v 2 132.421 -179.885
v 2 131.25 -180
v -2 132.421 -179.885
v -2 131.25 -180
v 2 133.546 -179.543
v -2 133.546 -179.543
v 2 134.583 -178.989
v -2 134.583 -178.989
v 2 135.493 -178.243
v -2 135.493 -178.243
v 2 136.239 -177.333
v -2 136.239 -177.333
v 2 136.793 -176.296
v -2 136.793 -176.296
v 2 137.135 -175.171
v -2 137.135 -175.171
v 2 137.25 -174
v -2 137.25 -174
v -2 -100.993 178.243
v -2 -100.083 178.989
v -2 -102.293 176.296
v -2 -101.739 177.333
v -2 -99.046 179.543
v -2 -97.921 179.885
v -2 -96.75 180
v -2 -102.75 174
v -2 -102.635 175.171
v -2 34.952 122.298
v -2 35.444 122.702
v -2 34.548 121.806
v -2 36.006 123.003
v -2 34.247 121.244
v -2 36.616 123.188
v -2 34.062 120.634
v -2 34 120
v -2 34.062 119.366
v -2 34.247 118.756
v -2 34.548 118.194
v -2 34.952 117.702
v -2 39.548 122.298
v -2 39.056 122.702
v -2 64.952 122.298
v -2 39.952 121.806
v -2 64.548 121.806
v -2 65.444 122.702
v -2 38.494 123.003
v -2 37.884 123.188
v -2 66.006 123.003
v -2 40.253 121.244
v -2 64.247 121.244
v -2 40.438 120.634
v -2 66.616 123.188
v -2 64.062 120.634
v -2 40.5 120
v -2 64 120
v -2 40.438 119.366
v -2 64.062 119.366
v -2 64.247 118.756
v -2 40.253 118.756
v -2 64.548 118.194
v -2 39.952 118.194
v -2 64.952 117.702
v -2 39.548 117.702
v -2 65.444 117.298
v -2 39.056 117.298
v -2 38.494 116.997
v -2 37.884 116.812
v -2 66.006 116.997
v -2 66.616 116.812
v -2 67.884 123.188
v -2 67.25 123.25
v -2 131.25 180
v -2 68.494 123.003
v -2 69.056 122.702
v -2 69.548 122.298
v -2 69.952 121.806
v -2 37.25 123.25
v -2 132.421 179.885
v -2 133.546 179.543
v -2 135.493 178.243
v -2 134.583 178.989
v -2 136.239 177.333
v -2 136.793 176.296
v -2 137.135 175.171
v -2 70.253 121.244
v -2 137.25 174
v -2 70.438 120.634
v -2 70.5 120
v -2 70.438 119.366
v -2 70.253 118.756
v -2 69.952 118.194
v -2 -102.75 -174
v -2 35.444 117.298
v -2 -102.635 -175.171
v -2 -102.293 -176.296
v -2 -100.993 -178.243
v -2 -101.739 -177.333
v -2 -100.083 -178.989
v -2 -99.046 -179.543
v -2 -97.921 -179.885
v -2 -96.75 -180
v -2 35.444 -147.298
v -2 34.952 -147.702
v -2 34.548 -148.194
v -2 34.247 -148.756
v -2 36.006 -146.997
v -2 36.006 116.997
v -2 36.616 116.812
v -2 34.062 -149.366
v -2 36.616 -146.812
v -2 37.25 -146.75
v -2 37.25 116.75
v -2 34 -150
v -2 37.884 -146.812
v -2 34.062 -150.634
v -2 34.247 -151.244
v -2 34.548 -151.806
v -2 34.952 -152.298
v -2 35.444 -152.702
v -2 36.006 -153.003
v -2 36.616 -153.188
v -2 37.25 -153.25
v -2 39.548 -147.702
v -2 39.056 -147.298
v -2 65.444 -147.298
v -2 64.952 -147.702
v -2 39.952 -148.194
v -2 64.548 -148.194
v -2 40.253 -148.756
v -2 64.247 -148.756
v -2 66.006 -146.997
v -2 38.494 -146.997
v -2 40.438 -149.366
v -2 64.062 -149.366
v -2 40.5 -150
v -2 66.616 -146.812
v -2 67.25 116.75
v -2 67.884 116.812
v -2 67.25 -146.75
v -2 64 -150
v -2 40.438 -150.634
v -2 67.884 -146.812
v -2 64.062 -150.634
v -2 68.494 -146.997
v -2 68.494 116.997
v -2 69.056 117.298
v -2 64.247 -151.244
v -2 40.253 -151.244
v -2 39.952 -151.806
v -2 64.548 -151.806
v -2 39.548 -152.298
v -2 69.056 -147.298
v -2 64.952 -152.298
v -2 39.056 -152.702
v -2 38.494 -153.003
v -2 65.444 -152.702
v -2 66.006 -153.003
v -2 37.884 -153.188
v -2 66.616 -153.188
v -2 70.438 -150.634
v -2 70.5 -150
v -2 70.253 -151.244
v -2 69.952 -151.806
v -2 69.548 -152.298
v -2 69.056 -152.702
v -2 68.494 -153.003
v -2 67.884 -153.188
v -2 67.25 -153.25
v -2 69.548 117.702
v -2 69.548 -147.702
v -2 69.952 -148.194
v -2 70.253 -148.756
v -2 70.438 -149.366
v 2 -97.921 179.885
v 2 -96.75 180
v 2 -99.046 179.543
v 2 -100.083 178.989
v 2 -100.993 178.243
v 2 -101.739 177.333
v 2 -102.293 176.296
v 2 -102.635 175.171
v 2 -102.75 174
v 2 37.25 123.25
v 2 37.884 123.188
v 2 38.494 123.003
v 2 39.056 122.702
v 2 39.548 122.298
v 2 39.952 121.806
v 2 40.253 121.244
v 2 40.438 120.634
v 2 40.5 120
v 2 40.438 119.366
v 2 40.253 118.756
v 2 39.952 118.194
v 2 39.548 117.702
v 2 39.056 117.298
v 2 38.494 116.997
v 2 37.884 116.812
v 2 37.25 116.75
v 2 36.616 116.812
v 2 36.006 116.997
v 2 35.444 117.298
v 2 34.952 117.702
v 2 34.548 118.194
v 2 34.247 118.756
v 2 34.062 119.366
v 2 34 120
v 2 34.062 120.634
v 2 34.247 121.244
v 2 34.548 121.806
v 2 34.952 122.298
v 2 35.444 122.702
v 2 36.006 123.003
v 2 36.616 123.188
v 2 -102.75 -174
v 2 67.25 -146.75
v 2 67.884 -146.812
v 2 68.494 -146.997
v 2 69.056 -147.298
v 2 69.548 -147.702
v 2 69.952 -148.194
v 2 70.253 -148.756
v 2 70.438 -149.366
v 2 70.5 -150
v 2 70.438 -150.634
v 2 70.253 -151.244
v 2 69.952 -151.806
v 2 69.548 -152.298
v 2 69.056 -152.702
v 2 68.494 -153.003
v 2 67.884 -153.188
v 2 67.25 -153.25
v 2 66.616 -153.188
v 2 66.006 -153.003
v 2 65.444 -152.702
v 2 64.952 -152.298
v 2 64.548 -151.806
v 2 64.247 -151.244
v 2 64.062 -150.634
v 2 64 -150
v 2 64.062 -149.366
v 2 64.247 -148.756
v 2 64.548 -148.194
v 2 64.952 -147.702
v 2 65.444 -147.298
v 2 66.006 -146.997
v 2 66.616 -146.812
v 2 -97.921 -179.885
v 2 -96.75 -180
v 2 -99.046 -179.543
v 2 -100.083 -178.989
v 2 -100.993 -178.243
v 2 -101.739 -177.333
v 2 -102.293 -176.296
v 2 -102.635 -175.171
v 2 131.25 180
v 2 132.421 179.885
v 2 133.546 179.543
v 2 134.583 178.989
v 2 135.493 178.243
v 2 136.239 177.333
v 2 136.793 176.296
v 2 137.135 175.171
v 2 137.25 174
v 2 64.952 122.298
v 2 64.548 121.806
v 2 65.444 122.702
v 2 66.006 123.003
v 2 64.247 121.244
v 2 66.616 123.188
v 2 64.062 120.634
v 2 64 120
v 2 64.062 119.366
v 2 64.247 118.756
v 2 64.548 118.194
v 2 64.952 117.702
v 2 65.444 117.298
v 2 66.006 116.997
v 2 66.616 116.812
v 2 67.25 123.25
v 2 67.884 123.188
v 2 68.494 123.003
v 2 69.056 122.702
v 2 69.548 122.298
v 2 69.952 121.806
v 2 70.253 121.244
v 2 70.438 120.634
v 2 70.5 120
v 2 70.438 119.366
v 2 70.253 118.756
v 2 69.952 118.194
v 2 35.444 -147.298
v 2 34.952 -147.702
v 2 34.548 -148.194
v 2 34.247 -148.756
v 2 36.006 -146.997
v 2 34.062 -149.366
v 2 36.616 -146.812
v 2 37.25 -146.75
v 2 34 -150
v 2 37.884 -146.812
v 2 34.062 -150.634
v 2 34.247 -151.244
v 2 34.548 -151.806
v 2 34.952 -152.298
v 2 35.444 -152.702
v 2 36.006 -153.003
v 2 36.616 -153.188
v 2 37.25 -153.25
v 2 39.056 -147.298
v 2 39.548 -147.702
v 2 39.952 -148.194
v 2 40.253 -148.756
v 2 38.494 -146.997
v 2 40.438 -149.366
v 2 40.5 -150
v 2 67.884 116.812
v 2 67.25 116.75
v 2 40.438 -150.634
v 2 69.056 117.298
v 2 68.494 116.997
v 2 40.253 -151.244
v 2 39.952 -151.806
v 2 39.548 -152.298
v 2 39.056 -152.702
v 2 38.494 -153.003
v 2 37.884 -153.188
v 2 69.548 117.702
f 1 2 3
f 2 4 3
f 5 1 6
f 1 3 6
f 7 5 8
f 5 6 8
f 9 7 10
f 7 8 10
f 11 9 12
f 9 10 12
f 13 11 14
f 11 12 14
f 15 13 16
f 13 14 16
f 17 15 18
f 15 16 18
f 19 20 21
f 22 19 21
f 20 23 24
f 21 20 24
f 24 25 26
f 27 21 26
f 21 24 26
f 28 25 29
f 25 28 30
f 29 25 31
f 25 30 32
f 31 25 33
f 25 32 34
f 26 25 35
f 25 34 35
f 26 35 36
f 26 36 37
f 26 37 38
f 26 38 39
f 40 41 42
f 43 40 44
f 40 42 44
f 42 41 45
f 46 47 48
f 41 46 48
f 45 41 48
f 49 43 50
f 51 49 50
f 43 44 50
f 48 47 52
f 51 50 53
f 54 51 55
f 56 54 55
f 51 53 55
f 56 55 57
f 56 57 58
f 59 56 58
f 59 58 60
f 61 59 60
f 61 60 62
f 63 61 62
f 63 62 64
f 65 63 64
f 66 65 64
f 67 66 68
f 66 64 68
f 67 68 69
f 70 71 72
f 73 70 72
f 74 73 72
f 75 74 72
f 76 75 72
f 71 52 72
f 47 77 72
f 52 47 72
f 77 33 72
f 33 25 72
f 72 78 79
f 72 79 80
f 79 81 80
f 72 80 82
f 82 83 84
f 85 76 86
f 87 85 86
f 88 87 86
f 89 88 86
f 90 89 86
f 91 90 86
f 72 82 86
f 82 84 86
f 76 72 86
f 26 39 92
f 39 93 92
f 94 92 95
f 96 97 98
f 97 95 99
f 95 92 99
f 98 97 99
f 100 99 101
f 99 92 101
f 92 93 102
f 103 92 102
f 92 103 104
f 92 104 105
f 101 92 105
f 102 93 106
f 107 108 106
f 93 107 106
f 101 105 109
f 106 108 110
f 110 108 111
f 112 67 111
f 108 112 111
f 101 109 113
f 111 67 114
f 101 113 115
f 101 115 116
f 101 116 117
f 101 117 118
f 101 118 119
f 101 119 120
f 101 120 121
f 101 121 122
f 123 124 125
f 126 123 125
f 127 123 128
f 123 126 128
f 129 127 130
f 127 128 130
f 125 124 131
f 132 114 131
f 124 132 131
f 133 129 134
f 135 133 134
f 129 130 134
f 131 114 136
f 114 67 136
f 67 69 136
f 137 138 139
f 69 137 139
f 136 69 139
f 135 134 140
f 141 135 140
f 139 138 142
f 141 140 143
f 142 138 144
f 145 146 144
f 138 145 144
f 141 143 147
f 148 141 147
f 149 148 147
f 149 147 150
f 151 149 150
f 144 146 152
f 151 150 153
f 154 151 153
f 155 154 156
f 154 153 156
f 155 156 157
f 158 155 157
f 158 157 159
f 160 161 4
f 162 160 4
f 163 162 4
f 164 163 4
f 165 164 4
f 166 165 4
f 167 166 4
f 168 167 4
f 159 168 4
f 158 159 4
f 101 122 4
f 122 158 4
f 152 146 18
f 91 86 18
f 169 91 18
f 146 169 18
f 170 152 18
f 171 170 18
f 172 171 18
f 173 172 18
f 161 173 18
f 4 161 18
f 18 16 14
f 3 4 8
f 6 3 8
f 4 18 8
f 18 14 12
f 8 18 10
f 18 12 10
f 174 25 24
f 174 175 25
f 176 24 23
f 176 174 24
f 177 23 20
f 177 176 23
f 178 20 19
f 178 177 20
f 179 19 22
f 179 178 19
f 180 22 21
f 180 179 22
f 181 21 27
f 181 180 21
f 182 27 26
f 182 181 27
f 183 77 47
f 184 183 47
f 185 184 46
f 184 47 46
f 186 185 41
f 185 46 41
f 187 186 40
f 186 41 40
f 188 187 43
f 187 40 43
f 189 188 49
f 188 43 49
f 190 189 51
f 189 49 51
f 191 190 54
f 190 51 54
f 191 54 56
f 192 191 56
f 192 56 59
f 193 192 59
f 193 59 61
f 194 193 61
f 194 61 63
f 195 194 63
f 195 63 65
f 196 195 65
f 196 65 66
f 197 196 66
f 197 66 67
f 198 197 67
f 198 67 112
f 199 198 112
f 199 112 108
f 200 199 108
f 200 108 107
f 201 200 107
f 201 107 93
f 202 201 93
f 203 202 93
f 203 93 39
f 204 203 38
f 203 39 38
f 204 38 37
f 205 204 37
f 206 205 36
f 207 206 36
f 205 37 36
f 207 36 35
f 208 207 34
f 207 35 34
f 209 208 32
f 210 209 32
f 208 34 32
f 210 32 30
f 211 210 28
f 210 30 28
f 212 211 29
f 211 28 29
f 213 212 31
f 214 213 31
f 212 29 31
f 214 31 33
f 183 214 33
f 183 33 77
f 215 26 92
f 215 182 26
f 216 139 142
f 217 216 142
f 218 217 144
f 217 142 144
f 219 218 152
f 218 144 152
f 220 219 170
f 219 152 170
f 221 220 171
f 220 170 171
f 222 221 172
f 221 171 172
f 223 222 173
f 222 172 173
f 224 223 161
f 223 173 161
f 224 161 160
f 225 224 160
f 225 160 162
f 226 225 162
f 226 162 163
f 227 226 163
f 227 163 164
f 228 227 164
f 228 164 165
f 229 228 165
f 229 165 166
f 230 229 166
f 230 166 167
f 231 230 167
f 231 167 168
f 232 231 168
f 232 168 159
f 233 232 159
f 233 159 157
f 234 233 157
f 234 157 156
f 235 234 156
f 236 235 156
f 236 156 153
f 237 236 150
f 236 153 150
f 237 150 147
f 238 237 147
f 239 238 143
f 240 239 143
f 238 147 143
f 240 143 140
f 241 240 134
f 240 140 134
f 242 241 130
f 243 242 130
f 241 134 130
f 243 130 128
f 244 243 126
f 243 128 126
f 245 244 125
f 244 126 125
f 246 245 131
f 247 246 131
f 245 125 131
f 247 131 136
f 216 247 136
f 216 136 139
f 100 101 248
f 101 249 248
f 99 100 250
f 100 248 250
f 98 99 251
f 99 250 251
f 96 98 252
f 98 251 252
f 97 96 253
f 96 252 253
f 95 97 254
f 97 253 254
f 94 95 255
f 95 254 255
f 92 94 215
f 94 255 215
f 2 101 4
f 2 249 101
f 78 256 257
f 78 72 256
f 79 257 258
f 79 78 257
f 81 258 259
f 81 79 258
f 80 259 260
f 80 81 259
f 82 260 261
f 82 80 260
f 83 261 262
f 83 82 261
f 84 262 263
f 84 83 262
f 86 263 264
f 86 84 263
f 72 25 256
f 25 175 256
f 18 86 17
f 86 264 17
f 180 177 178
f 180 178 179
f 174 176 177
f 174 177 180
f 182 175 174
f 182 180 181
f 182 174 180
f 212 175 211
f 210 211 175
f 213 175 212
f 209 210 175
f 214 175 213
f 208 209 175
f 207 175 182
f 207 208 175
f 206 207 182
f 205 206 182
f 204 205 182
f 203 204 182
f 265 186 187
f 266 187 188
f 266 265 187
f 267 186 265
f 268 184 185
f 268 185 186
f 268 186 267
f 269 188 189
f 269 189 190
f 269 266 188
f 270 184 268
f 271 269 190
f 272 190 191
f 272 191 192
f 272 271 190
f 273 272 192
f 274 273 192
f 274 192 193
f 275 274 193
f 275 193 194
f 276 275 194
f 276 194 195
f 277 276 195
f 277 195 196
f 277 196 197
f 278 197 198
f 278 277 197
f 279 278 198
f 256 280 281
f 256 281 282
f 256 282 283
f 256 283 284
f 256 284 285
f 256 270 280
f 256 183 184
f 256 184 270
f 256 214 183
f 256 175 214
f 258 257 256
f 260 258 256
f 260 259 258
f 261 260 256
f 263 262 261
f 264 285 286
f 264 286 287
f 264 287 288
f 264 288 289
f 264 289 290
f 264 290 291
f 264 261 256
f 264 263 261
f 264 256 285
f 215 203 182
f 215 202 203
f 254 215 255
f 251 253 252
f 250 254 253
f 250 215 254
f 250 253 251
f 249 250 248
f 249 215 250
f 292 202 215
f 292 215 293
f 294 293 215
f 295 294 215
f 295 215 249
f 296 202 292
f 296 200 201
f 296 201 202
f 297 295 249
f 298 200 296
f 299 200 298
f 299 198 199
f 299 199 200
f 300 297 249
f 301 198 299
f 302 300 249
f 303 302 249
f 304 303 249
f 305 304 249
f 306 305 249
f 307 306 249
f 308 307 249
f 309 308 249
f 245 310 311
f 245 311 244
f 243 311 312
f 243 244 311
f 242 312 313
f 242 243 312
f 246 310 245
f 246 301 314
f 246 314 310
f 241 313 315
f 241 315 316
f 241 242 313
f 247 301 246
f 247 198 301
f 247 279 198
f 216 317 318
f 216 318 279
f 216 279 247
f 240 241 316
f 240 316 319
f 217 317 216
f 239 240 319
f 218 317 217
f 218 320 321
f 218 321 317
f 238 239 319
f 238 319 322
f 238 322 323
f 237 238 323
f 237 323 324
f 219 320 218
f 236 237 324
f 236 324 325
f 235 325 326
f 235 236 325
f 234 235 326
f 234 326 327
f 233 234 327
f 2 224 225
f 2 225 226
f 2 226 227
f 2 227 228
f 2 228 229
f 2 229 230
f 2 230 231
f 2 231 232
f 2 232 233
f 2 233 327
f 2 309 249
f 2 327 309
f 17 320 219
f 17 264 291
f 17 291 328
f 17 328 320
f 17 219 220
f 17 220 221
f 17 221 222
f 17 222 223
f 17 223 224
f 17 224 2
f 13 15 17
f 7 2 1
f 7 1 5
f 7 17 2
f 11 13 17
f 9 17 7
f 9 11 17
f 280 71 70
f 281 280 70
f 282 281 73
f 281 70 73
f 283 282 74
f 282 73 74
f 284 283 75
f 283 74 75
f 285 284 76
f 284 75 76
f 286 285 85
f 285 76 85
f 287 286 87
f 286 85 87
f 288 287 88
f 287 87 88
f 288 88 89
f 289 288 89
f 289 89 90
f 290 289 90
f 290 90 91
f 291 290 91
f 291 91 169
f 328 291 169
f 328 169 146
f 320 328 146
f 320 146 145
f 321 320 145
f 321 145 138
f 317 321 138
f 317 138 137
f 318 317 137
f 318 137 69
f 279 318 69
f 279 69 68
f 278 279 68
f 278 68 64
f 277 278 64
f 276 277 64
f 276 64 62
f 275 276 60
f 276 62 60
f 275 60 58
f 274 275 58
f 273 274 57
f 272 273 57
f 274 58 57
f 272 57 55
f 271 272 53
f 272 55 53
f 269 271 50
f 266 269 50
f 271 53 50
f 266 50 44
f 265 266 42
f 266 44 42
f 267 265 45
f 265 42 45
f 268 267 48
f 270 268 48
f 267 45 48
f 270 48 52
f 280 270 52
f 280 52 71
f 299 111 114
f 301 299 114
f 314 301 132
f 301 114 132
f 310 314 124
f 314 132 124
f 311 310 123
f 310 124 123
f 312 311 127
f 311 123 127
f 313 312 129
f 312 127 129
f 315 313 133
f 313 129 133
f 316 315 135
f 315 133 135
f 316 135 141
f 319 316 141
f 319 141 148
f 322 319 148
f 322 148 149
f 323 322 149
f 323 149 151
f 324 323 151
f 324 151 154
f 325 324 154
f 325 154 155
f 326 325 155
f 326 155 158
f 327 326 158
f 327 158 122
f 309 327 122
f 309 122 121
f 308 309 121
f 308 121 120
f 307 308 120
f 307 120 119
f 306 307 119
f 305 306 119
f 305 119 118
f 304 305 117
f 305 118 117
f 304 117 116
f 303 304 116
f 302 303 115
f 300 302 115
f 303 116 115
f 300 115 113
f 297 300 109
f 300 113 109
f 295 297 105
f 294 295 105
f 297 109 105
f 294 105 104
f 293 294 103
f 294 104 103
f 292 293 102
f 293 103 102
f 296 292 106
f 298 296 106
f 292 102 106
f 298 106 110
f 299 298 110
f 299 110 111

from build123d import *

# Parameters (mm, degrees)
SKETCH1_W                  = 360
SKETCH1_H                  = 240
BOSS_EXTRUDE1_DEPTH        = 2
FILLET3_R                  = 6
F_6_5_6_5_DIAMETER_HOLE1_D = 6.5


with BuildPart() as part:
    # Sketch1 → Boss-Extrude1 (new, symmetric)
    with BuildSketch(Plane(origin=(0, 0, 0), x_dir=(0, 0, -1), z_dir=(1, 0, 0))):
        with Locations((0, 17.25)):
            Rectangle(SKETCH1_W, SKETCH1_H)
    extrude(amount=BOSS_EXTRUDE1_DEPTH, both=True)

    # Fillet3
    fillet3_edges = [part.edges().sort_by_distance(p)[0] for p in [
        (0, -102.75, -180),
        (0, -102.75, 180),
        (0, 137.25, 180),
        (0, 137.25, -180),
    ]]
    fillet(fillet3_edges, radius=FILLET3_R)

    # Ø6.5 (6.5) Diameter Hole1 (through all)
    with Locations(Plane(origin=(2, 0, 0), x_dir=(0, 0, -1), z_dir=(1, 0, 0))):
        with Locations((-120, 67.25), (150, 37.25), (-120, 37.25), (150, 67.25)):
            Hole(F_6_5_6_5_DIAMETER_HOLE1_D / 2)


solid = part.part
